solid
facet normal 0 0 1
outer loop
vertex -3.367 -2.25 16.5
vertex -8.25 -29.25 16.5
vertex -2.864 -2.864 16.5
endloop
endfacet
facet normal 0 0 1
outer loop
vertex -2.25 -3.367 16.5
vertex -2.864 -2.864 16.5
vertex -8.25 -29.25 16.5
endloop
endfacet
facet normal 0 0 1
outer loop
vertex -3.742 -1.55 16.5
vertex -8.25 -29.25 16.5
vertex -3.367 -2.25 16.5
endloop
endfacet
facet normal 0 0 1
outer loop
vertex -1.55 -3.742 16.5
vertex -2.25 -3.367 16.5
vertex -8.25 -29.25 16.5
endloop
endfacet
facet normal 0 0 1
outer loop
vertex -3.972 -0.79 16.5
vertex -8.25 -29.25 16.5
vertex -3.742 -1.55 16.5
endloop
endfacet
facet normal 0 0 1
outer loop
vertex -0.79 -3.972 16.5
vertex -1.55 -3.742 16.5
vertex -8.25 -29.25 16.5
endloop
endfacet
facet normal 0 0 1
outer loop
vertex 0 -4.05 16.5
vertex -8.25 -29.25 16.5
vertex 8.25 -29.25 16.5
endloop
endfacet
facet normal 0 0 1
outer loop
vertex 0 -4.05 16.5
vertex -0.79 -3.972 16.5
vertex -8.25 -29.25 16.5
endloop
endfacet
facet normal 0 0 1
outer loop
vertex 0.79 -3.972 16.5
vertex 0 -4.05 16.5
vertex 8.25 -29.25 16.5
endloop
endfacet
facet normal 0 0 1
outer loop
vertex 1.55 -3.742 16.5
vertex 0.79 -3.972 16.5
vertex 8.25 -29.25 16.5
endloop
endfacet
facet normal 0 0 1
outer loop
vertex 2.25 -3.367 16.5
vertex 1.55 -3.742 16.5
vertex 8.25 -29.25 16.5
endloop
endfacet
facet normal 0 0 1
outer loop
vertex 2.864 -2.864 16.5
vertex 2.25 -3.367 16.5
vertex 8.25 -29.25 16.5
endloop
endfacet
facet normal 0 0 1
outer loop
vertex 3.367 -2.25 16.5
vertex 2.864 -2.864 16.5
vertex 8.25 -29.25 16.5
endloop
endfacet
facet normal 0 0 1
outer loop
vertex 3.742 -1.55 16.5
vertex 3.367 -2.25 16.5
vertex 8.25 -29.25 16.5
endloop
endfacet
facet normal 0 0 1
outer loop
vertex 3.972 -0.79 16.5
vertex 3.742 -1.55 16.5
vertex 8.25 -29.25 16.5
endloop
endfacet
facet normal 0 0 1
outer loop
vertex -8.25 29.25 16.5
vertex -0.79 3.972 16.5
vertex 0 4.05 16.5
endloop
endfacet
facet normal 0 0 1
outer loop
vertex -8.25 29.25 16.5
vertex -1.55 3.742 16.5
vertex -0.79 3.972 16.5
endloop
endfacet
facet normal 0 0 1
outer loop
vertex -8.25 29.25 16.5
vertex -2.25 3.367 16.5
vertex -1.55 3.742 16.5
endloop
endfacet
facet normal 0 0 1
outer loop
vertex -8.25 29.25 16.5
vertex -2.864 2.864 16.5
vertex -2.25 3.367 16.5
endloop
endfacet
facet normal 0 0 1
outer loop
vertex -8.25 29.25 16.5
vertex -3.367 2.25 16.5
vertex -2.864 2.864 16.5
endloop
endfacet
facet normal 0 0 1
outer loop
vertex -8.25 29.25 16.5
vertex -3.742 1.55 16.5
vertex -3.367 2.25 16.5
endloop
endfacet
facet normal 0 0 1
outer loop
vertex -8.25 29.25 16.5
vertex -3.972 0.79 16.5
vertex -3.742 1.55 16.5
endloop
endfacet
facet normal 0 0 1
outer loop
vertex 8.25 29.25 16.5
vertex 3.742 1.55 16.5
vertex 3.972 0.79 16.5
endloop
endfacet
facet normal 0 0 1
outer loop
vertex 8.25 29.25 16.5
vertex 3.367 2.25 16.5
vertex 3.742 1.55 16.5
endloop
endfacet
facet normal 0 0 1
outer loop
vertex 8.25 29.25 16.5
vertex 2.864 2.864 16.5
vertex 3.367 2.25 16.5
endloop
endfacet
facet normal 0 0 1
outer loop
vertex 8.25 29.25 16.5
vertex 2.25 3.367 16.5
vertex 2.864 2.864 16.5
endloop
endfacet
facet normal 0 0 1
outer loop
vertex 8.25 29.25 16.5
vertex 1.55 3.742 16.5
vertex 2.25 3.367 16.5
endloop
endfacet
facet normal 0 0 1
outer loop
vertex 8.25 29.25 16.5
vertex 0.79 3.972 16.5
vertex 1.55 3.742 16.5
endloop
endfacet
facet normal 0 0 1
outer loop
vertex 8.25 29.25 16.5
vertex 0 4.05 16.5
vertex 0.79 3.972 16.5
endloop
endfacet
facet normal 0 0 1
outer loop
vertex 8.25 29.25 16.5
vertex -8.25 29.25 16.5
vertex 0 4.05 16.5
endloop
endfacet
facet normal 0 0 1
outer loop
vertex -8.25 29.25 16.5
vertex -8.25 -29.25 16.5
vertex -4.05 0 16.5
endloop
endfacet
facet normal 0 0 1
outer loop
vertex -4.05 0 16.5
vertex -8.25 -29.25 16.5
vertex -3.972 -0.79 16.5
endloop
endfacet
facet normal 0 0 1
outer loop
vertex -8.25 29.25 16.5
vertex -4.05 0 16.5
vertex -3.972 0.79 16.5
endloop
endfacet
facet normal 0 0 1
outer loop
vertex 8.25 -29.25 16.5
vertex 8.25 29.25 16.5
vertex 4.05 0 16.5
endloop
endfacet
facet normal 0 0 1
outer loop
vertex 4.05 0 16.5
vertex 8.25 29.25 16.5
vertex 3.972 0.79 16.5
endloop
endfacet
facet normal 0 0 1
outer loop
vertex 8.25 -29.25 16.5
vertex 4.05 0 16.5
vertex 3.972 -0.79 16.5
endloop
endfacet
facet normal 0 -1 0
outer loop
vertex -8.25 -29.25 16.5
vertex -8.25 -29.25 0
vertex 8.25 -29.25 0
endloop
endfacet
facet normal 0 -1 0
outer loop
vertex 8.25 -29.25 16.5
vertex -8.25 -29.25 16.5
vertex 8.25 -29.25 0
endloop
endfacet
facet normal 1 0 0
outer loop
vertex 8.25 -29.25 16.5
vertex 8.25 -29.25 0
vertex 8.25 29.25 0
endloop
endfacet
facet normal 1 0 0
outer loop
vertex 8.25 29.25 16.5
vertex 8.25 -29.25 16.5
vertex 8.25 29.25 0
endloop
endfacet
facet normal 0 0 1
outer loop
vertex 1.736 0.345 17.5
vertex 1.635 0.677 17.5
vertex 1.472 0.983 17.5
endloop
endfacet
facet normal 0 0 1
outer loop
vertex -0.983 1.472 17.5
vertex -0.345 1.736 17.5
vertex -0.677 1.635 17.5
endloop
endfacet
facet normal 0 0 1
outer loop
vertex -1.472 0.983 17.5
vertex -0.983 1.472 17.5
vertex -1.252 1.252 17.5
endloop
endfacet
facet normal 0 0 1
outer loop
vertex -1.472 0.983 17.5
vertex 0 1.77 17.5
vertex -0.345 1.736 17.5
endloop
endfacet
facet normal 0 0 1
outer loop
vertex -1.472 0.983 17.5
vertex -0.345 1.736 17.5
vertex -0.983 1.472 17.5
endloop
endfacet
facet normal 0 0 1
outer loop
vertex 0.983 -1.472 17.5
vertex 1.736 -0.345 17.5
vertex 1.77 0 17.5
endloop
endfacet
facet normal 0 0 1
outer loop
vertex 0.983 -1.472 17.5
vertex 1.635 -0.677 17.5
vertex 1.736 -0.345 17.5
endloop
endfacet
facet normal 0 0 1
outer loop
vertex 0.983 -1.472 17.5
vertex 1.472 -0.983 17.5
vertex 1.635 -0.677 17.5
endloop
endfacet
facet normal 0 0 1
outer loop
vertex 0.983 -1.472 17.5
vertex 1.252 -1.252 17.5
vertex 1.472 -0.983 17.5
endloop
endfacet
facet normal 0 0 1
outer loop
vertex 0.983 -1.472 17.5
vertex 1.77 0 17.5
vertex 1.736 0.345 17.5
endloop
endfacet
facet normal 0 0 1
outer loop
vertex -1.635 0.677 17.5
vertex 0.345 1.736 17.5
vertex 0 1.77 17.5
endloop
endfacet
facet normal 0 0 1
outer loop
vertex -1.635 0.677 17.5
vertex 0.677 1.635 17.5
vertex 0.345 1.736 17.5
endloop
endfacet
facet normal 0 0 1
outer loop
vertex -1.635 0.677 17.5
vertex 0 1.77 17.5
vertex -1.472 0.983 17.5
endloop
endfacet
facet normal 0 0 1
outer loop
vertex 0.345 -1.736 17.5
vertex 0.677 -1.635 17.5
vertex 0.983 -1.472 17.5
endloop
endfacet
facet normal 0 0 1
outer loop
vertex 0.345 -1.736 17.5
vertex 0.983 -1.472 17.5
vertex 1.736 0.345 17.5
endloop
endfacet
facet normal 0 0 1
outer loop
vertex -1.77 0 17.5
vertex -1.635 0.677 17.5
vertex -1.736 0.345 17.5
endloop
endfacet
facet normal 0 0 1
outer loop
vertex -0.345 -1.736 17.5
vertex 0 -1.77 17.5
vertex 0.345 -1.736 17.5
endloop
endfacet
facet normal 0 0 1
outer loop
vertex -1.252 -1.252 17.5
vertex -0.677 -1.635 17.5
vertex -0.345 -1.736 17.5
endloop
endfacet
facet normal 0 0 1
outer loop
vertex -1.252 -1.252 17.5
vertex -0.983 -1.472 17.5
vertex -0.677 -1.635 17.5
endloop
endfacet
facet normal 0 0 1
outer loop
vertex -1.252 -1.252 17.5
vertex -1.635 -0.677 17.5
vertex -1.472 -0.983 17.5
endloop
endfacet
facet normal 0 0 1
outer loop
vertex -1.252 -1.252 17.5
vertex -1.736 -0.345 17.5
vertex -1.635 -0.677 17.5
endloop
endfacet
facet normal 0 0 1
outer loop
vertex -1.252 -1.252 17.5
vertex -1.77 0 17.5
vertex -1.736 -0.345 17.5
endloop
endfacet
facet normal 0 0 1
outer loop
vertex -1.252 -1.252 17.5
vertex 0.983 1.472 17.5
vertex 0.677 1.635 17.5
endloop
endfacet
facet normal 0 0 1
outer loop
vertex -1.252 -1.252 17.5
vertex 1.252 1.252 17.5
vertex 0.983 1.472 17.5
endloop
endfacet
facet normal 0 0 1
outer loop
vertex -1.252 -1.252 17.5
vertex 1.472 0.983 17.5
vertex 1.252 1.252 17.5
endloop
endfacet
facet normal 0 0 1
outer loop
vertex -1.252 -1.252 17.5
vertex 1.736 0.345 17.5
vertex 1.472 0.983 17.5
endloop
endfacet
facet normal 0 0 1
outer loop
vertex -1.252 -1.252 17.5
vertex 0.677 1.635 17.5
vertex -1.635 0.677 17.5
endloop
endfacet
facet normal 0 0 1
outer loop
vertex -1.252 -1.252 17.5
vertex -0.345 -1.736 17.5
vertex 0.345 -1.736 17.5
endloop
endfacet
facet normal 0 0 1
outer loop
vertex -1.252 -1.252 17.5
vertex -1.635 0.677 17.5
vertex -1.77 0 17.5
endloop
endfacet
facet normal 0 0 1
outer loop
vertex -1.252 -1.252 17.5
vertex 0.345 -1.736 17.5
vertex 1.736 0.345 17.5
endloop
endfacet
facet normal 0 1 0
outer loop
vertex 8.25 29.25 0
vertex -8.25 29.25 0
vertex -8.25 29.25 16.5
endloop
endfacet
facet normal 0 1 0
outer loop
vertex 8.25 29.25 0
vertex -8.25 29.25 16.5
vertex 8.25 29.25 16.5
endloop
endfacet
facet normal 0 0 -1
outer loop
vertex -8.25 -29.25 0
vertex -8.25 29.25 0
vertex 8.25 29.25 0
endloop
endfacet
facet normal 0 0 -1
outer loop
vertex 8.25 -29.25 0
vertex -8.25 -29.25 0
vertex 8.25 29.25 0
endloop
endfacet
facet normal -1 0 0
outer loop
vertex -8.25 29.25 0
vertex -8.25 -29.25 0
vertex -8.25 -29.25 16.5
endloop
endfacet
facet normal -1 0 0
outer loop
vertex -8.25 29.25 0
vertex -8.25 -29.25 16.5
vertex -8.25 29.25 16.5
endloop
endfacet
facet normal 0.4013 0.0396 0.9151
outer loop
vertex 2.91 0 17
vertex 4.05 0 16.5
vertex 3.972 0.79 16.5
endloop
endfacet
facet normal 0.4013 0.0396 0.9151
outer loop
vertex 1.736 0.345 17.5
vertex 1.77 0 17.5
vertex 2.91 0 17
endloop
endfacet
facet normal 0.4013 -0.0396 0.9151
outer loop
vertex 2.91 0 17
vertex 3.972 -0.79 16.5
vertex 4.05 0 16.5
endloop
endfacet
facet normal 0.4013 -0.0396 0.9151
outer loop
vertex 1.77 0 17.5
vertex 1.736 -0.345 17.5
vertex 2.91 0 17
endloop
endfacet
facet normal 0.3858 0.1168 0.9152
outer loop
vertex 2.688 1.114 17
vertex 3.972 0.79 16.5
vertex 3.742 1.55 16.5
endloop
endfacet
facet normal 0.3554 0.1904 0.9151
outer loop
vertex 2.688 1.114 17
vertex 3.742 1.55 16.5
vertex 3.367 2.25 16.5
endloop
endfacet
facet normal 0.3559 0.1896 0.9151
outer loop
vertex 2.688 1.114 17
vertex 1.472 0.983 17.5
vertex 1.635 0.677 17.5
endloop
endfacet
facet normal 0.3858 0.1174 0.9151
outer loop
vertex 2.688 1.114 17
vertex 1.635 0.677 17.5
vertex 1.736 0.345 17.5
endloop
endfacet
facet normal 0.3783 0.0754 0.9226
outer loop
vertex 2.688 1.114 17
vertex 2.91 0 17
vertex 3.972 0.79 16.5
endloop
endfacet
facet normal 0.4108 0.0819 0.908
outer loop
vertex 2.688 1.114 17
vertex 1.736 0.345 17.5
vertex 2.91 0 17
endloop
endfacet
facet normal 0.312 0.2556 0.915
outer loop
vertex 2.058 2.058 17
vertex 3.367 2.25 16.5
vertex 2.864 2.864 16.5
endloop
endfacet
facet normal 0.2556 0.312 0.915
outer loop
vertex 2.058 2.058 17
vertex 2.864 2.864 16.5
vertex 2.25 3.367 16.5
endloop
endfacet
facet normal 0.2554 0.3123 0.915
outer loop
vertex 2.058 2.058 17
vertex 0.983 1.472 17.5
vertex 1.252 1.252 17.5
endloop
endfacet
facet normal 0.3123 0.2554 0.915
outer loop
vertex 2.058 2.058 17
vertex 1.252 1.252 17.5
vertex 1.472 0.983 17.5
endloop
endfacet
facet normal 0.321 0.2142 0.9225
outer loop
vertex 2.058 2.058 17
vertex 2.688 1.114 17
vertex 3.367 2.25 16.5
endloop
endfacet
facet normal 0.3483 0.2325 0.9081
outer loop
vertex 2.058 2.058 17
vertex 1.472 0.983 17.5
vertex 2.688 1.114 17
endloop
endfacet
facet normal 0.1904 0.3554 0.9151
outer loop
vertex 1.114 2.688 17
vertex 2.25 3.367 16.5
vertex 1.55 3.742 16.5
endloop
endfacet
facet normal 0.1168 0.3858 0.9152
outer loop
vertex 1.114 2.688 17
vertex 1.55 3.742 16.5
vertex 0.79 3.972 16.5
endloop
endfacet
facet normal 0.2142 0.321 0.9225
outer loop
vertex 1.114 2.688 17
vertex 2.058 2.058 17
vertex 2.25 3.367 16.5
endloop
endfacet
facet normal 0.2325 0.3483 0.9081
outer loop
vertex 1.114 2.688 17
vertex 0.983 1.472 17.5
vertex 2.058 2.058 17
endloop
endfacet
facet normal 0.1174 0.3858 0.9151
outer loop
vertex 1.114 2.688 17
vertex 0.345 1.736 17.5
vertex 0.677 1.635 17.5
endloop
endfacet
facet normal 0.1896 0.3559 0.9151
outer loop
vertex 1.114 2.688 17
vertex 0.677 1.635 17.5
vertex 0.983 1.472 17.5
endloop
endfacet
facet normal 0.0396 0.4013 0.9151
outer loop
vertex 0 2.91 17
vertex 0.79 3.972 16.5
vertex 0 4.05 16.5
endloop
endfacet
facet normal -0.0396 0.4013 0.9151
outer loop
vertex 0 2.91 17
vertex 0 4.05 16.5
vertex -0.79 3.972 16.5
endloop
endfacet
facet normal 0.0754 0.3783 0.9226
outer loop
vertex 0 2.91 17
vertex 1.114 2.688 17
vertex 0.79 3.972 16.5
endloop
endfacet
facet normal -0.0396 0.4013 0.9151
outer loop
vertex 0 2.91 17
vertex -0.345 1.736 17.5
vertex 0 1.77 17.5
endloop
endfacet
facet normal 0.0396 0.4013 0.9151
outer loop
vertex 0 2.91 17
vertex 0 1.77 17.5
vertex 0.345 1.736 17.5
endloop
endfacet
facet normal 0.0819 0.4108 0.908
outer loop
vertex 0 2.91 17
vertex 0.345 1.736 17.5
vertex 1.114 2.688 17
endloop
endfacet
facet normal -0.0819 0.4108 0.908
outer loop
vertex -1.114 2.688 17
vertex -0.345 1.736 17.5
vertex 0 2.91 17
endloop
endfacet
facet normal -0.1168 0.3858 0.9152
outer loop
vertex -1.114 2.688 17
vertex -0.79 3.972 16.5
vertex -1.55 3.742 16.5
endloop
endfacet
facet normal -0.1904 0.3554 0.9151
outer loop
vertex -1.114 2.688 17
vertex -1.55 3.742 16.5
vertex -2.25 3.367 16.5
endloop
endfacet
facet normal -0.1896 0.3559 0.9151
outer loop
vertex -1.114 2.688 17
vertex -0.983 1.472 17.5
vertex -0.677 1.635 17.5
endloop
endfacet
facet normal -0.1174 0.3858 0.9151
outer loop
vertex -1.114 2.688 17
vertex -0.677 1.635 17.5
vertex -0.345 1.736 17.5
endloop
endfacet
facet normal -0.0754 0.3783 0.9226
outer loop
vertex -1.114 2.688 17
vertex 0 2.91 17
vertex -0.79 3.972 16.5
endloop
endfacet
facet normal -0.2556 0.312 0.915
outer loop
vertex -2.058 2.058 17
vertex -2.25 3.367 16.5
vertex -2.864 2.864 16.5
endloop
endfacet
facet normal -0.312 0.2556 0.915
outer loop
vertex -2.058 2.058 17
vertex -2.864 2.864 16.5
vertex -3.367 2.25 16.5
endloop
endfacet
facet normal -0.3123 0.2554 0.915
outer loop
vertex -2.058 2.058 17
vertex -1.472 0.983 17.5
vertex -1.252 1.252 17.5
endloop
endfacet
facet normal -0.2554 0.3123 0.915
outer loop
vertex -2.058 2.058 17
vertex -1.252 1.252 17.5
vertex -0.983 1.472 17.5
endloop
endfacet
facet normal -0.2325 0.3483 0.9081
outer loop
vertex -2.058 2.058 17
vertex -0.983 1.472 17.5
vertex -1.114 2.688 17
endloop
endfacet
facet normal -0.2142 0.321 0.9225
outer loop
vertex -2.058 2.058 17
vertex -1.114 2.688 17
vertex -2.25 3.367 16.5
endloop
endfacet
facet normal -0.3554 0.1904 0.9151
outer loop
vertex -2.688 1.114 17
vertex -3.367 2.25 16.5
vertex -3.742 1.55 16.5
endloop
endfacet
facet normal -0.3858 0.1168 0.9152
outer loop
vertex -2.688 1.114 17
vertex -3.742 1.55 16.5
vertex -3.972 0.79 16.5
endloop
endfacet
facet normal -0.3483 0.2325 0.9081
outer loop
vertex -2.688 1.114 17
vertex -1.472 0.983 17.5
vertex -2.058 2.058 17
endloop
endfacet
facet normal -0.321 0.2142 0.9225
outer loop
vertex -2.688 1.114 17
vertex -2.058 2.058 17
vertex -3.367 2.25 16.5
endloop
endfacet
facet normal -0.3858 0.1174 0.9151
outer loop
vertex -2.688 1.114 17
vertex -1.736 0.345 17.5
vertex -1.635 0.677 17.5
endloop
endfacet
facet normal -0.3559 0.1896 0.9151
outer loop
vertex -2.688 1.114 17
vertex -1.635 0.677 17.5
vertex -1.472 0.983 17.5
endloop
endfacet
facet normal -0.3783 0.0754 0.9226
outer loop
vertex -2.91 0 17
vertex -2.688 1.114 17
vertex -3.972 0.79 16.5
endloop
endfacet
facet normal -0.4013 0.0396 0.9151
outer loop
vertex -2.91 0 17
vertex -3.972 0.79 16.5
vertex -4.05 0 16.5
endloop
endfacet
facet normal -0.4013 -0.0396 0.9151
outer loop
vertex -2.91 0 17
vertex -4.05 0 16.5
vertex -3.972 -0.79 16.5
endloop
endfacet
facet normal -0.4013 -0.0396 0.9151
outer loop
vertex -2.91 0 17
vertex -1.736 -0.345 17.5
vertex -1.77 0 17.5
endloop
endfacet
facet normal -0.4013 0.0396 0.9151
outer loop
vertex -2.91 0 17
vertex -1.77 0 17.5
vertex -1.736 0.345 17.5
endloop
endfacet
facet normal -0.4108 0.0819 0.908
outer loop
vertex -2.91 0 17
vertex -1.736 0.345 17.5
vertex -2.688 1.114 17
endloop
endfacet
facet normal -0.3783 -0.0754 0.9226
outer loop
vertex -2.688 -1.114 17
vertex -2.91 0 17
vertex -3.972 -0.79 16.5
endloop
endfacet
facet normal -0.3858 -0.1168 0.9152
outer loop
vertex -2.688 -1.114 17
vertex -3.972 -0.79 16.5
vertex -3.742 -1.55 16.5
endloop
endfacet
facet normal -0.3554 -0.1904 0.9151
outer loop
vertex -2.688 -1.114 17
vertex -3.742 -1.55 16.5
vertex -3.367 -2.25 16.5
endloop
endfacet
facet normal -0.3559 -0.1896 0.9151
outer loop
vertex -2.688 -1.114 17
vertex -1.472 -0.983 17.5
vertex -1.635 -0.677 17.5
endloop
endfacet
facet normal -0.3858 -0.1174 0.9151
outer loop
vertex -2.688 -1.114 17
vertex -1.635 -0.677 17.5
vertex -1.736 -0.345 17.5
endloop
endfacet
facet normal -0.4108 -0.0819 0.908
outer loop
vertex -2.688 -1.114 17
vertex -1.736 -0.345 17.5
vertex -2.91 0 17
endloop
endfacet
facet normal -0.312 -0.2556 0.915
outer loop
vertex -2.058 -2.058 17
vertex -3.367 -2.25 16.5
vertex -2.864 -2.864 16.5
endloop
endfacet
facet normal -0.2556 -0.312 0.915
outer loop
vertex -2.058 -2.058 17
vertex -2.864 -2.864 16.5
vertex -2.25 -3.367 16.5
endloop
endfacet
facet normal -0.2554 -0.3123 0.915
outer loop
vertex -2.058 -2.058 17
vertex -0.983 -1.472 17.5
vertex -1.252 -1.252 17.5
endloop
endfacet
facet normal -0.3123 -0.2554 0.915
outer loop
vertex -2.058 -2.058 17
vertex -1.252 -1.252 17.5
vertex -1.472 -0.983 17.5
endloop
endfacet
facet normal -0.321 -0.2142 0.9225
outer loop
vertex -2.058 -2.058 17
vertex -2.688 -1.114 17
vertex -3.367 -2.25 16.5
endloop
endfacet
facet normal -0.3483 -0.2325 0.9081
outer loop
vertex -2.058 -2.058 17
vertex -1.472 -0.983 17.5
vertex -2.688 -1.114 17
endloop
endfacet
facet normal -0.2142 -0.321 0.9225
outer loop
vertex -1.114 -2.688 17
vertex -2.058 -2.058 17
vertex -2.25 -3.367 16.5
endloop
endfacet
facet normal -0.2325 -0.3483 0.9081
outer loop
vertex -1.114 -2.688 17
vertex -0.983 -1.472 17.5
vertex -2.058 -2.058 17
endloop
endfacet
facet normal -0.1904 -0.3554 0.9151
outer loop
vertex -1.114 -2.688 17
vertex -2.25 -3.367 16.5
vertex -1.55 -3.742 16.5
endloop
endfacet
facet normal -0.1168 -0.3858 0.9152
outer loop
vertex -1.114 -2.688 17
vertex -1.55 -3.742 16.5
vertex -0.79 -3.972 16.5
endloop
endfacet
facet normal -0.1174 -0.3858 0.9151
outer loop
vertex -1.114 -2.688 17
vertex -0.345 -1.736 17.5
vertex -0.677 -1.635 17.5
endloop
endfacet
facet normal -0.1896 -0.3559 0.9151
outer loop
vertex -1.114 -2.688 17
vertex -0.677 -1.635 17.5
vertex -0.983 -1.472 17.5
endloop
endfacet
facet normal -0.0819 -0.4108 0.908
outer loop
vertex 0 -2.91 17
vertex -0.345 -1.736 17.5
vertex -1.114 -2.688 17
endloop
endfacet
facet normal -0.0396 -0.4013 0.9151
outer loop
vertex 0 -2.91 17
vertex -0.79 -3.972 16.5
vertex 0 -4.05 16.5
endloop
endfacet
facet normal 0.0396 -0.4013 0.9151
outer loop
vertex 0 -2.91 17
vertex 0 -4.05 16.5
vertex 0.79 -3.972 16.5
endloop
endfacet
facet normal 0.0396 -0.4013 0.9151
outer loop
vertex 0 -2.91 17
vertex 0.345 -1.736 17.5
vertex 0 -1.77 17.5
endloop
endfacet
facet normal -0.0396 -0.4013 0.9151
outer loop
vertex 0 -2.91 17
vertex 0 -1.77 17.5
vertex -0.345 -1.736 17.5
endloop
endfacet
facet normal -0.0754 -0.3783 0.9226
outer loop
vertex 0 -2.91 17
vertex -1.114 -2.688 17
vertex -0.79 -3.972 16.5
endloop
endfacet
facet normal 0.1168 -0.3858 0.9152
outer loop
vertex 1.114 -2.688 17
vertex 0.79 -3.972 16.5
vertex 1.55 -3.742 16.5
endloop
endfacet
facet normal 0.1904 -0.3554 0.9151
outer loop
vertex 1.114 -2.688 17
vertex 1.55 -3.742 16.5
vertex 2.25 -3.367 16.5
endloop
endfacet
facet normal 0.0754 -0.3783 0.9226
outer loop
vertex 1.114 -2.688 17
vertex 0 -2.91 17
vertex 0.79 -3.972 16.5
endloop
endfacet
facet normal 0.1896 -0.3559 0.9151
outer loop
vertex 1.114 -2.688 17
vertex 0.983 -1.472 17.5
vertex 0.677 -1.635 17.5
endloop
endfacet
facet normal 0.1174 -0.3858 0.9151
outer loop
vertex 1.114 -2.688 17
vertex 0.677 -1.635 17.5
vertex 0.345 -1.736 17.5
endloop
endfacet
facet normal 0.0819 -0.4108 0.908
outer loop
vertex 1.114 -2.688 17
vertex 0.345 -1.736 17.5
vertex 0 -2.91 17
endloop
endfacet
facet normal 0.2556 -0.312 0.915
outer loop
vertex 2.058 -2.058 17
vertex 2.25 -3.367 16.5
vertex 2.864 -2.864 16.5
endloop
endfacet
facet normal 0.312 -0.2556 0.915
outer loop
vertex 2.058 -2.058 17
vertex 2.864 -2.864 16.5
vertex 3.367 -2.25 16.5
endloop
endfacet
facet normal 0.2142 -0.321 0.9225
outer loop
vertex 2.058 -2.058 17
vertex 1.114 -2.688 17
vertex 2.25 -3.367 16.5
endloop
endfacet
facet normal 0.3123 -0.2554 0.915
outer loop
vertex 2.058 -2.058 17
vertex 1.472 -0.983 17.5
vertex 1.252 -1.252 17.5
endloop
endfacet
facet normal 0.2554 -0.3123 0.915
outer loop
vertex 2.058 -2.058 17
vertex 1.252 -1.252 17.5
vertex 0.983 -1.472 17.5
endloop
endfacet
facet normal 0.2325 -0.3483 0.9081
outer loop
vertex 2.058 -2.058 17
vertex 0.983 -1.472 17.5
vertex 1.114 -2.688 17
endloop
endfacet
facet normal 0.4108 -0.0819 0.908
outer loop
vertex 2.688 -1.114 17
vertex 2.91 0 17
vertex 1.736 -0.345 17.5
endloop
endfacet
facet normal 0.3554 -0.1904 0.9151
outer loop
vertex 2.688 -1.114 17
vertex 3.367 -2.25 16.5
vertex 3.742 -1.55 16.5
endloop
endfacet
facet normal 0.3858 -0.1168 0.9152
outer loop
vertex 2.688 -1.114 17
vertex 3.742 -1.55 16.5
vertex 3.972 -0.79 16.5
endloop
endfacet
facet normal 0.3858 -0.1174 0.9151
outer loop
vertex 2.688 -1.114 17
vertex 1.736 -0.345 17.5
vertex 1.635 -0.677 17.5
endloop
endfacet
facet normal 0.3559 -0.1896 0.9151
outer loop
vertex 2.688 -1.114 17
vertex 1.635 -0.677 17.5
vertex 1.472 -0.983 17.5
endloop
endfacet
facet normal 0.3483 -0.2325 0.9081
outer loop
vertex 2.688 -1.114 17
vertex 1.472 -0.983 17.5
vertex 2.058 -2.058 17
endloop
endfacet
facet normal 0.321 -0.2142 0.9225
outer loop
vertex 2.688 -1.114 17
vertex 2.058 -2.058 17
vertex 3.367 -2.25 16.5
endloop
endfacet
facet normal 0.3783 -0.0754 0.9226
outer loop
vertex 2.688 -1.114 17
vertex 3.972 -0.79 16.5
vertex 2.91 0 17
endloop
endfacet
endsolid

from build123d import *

# Parameters (mm, degrees)
SKETCH1_W           = 16.5
SKETCH1_H           = 58.5
BOSS_EXTRUDE1_DEPTH = 16.5
SKETCH4_R           = 1.77
BOSS_EXTRUDE6_DEPTH = 1
SKETCH4_16_R        = 4.05


with BuildPart() as part:
    # Sketch1 → Boss-Extrude1 (new body)
    with BuildSketch(Plane.XY):
        Rectangle(SKETCH1_W, SKETCH1_H)
    extrude(amount=BOSS_EXTRUDE1_DEPTH)

    # Sketch4 → Boss-Extrude6 (add)
    with BuildSketch(Plane.XY.offset(16.5)):
        Circle(SKETCH4_R)
    extrude(amount=BOSS_EXTRUDE6_DEPTH)

    # Sketch4<16> → section 0 of loft3
    with BuildSketch(Plane.XY.offset(16.5), mode=Mode.PRIVATE) as loft3_s0:
        Circle(SKETCH4_16_R)
    # loft up to a face of the part (loft3)
    loft([loft3_s0.sketch, Face(Wire([part.edges().sort_by_distance((-1.211648377, 1.290274471, 17.5))[0]]))])


solid = part.part
